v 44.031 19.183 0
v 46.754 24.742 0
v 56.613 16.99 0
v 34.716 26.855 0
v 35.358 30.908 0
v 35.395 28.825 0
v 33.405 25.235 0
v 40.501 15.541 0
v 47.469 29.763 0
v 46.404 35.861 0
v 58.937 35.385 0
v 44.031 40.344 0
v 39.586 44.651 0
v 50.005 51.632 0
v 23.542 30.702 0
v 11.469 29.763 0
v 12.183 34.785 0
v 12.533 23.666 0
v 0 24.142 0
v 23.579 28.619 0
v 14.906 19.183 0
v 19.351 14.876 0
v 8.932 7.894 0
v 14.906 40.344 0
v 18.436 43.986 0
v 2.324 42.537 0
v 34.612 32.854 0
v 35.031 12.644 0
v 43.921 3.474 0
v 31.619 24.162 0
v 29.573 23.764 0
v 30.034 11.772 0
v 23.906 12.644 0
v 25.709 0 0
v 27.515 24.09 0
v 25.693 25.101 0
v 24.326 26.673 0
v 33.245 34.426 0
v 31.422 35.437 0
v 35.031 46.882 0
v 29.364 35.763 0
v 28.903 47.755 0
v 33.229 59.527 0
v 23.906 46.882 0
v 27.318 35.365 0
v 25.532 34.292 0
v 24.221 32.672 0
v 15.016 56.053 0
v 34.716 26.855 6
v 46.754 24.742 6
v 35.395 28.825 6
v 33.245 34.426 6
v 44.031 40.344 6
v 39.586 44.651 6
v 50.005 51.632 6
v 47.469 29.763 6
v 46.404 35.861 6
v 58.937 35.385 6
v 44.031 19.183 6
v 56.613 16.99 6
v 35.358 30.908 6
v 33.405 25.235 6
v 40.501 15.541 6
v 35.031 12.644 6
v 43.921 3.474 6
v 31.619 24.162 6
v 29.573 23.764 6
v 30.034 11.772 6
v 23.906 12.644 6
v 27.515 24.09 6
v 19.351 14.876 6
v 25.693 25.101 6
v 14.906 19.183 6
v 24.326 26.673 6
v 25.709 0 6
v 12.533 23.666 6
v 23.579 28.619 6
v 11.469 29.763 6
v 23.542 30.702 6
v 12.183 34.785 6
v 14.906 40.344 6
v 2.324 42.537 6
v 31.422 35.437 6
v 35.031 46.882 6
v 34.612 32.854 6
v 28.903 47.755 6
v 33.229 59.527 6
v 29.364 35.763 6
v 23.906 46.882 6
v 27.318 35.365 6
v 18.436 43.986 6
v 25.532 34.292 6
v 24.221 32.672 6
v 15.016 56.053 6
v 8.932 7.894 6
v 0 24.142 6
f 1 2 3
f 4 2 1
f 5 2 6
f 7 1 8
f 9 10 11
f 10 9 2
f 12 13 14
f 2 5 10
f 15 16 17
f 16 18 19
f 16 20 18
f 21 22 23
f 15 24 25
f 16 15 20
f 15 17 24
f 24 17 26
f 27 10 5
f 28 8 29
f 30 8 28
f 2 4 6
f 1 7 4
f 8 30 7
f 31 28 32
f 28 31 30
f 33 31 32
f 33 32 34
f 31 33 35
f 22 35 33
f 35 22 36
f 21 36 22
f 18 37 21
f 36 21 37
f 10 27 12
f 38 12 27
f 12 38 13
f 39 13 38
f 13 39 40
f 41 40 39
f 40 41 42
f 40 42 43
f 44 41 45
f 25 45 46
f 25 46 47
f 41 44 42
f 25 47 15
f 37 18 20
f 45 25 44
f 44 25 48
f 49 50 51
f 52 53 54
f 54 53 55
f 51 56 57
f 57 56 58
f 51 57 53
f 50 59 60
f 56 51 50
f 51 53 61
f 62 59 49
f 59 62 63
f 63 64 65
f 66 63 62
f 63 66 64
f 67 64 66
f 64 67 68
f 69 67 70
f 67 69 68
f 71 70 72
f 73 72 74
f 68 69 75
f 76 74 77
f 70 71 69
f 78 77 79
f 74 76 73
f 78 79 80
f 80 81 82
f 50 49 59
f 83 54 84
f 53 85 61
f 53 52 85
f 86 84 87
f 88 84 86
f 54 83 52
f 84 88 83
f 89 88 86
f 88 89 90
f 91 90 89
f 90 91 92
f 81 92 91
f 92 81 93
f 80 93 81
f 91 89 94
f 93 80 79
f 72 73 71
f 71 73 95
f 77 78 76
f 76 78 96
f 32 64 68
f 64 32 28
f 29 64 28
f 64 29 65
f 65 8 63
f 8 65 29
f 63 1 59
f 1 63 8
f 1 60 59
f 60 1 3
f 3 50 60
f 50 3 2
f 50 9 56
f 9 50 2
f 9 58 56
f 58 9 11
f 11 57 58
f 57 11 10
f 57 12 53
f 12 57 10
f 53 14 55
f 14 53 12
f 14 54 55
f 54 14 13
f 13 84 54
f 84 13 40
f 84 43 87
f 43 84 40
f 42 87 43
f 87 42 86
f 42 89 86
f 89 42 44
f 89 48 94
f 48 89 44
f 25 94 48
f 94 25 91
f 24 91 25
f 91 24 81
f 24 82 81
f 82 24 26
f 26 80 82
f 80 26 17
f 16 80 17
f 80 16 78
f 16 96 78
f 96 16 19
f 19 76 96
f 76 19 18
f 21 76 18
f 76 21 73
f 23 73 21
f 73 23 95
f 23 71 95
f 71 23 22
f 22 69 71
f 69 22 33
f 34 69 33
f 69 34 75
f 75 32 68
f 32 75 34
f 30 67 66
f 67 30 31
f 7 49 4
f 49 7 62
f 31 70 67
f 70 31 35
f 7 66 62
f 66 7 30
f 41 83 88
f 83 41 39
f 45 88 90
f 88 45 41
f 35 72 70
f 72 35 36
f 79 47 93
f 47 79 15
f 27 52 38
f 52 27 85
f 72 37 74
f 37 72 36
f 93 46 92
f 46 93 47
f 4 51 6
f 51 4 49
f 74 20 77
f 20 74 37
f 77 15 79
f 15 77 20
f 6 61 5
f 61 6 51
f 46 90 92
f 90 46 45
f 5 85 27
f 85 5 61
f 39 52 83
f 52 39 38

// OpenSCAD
$fn = 32;

// ----------------------------------------------------------------------
// Star wheel: 10-point ratchet, R30
// ----------------------------------------------------------------------

// --- parameters (mm) ---
n_points = 10;            // number of points / teeth
r_out = 30;               // tip radius
r_in = 18;                // root radius
bore_r = 6;               // centre bore radius
plate_t = 6;              // plate thickness, Z (extrusion height)
bore_d = 12;              // centre bore diameter

profile = [[47.469, 29.763], [58.937, 35.385], [46.404, 35.861], [44.031, 40.344], [50.005, 51.632], [39.586, 44.651], [35.031, 46.882], [33.229, 59.527], [28.903, 47.755], [23.906, 46.882], [15.016, 56.053], [18.436, 43.986], [14.906, 40.344], [2.324, 42.537], [12.183, 34.785], [11.469, 29.763], [0, 24.142], [12.533, 23.666], [14.906, 19.183], [8.932, 7.894], [19.351, 14.876], [23.906, 12.644], [25.709, 0], [30.034, 11.772], [35.031, 12.644], [43.921, 3.474], [40.501, 15.541], [44.031, 19.183], [56.613, 16.99], [46.754, 24.742]];  // primary outline, 30 points, counter clockwise
void_1 = [[35.358, 30.908], [34.612, 32.854], [33.245, 34.426], [31.422, 35.437], [29.364, 35.763], [27.318, 35.365], [25.532, 34.292], [24.221, 32.672], [23.542, 30.702], [23.579, 28.619], [24.326, 26.673], [25.693, 25.101], [27.515, 24.09], [29.573, 23.764], [31.619, 24.162], [33.405, 25.235], [34.716, 26.855], [35.395, 28.825]];  // centre bore, 18 points

// --- the one profile operation ---
difference() {
  linear_extrude(height = plate_t) polygon(points = profile);
  translate([0, 0, -1])
    linear_extrude(height = plate_t + 2) polygon(points = void_1);
}
